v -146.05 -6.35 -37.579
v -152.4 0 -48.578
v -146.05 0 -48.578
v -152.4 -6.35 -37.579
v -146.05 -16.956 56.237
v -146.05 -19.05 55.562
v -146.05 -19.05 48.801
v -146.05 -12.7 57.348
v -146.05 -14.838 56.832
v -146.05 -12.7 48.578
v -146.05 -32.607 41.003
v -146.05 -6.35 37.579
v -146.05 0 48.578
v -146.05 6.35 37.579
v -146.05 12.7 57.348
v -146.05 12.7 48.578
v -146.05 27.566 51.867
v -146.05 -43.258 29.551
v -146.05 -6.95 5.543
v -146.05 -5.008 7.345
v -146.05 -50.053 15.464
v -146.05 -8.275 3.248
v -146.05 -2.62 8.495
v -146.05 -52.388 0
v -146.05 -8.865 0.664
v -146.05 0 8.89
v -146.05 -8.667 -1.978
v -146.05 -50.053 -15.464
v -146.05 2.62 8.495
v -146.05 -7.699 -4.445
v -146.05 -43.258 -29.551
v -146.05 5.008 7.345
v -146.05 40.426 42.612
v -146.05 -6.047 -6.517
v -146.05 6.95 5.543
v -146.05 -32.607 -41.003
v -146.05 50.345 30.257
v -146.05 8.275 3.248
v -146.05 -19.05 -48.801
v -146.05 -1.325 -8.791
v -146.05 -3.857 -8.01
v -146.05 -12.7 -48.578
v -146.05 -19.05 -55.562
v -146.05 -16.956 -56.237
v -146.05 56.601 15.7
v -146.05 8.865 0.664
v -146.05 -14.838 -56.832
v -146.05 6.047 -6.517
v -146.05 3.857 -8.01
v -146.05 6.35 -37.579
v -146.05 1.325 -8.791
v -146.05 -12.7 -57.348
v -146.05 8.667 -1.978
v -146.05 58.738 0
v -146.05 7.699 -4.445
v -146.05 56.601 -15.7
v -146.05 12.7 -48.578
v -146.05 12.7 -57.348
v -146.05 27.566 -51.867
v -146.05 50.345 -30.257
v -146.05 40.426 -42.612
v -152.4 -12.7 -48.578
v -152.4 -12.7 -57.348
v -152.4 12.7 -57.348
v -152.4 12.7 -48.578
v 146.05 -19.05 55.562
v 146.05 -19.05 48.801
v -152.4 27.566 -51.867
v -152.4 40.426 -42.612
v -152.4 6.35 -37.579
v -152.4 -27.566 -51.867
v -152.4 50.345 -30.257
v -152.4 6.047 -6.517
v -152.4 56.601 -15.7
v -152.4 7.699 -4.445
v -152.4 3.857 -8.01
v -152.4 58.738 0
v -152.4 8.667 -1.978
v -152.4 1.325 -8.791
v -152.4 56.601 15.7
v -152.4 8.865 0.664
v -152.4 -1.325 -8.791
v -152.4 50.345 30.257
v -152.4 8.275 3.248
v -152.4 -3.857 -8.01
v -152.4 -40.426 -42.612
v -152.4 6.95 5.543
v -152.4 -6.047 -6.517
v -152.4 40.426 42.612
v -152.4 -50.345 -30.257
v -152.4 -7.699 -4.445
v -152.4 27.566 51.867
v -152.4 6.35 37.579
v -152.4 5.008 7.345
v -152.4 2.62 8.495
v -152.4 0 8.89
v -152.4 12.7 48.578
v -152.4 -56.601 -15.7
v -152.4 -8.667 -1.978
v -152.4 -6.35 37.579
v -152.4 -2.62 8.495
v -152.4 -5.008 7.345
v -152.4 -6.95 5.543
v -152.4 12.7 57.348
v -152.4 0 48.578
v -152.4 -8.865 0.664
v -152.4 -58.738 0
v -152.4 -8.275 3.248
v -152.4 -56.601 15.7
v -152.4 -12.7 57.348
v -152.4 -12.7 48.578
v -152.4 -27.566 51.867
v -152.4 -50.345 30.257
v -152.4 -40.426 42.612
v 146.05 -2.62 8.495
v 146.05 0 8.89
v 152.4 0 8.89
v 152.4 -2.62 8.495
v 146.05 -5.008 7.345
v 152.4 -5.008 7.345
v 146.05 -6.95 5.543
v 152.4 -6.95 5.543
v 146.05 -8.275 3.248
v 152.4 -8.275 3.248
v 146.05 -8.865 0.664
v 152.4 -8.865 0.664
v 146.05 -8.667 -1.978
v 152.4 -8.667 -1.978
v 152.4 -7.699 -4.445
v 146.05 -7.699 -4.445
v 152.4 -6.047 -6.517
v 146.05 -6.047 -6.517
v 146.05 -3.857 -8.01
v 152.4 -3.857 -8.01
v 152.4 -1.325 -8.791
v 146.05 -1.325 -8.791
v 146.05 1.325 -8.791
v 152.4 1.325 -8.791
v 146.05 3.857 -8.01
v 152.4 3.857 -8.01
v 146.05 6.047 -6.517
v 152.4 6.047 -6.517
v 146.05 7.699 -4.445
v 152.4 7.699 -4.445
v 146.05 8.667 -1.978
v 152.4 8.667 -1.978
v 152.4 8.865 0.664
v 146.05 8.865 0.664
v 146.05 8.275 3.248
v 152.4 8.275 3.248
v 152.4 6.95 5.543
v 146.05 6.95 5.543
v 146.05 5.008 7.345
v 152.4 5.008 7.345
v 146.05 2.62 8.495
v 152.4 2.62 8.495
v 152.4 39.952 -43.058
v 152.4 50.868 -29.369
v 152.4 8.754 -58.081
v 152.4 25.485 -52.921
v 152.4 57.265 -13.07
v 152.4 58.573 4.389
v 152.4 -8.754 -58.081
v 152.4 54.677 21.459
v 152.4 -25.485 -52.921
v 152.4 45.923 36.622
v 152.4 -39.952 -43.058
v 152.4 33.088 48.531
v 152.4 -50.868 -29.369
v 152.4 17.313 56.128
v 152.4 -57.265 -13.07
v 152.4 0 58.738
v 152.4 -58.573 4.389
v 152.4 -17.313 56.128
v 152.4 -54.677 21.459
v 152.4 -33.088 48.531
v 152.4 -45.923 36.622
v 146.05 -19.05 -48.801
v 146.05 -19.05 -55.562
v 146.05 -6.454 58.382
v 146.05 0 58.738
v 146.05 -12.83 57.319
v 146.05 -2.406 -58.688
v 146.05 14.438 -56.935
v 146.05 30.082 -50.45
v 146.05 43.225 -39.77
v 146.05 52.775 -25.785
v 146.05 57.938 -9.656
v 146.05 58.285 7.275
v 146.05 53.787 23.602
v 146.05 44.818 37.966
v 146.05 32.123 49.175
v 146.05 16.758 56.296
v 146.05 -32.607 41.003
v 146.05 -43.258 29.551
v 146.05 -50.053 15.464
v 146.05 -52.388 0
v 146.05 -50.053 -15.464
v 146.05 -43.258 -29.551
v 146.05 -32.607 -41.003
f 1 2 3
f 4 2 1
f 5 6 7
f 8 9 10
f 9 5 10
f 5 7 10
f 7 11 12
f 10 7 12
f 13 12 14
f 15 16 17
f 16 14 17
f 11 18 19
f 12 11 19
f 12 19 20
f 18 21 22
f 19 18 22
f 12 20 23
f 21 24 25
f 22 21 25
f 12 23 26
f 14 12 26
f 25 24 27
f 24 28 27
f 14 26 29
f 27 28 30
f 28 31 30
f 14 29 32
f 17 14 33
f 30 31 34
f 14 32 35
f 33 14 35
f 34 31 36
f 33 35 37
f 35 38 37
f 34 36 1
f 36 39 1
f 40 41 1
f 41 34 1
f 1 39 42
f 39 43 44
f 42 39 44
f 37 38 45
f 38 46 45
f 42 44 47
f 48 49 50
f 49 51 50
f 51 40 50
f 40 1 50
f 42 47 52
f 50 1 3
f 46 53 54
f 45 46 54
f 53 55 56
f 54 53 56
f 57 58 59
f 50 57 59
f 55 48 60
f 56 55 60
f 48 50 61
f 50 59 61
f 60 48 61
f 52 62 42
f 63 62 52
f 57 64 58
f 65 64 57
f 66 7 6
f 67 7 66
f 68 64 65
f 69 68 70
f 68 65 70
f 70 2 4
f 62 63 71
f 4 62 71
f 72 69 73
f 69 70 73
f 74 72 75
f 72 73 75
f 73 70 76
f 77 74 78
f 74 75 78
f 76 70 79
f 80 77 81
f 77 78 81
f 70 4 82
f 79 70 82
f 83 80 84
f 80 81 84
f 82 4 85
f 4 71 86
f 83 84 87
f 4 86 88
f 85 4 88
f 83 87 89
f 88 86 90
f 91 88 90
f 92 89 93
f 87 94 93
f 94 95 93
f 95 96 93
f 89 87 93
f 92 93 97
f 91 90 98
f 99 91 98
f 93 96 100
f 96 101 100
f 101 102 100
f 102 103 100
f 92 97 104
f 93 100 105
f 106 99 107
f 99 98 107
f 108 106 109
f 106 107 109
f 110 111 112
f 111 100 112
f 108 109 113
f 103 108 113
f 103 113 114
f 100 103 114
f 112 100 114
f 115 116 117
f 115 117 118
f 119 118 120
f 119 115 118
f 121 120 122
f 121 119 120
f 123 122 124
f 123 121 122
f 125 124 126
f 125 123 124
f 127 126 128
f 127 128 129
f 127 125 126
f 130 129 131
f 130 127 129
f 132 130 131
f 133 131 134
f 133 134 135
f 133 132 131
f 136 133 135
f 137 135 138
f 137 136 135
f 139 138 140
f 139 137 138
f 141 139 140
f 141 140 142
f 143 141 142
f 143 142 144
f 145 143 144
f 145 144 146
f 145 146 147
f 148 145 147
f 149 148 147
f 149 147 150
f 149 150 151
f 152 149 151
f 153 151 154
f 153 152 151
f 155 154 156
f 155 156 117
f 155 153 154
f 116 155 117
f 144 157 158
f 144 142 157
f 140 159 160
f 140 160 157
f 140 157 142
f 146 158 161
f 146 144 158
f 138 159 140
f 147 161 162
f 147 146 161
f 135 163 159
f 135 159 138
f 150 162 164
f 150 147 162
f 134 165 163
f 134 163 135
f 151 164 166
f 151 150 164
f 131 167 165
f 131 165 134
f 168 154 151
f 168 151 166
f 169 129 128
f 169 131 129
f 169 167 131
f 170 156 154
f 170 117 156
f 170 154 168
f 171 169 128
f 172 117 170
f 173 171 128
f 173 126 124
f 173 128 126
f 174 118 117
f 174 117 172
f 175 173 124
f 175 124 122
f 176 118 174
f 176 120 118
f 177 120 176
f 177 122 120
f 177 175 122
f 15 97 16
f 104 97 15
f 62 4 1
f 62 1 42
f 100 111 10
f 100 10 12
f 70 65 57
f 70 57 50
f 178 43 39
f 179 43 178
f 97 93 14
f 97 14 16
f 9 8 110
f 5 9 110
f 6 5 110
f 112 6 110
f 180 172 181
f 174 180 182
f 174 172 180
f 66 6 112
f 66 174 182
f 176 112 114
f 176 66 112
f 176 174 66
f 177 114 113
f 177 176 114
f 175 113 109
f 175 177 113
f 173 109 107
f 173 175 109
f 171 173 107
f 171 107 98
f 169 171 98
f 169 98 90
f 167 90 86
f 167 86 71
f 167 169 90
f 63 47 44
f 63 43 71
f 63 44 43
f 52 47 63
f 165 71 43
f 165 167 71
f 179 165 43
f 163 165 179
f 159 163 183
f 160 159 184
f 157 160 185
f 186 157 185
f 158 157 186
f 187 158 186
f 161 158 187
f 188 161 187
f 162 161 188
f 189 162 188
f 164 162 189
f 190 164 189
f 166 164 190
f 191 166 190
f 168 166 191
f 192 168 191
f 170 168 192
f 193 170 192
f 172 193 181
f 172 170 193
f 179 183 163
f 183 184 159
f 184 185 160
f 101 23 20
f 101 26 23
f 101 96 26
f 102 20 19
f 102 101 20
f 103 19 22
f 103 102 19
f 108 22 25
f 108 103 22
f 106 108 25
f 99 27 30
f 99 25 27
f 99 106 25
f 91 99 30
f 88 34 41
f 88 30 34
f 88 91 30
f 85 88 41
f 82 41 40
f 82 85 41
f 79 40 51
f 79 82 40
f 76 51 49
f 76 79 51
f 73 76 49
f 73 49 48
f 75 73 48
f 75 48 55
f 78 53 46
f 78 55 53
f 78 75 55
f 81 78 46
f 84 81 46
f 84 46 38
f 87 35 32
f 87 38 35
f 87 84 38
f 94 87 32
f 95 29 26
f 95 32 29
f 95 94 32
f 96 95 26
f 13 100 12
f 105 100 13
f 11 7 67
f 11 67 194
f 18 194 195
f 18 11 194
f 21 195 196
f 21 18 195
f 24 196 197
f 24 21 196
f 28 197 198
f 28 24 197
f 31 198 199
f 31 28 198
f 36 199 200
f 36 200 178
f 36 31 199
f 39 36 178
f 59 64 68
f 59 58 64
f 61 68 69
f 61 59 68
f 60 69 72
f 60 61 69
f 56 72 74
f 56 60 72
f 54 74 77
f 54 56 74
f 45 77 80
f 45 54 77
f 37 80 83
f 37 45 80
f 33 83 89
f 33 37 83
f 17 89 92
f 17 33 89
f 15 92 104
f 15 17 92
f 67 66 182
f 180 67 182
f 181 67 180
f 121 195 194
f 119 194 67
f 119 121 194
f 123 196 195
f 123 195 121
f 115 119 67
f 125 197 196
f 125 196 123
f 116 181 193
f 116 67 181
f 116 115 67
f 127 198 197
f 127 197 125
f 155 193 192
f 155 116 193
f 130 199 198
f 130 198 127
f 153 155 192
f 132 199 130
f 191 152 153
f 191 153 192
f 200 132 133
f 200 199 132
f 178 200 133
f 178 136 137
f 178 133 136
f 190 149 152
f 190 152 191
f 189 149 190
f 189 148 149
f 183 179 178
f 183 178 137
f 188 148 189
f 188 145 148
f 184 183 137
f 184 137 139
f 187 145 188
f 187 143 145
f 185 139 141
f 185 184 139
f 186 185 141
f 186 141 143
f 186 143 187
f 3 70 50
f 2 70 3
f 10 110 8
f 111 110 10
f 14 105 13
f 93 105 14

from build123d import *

# Parameters (mm, degrees)
SKETCH1_R               = 58.7375
SKETCH1_R_2             = 8.89
BOSS_EXTRUDE1_DEPTH     = 152.4
CUT_EXTRUDE1_DEPTH      = 174.568279972
CUT_EXTRUDE1_DEPTH_BACK = 174.568279972
SKETCH2_W               = 292.1
SKETCH2_H               = 77.7875
SHELL1_START            = -146.05
SHELL1_DEPTH            = 292.1
CUT_EXTRUDE2_DEPTH      = 12.7


# Read off the part's stored shape, not the designer's step: Shell1
with BuildPart() as part:
    # Sketch1 → Boss-Extrude1 (new, symmetric)
    with BuildSketch(Plane(origin=(0, 0, 0), x_dir=(0, 0, -1), z_dir=(1, 0, 0))):
        with Locations(Location((0, 0, 0), (0, 0, 180))):
            Circle(SKETCH1_R)
        with Locations(Location((0, 0, 0), (0, 0, 180))):
            Circle(SKETCH1_R_2, mode=Mode.SUBTRACT)
    extrude(amount=BOSS_EXTRUDE1_DEPTH, both=True)

    # Sketch2 → Cut-Extrude1 (cut, two sides: drawn at the far end of the back side and taken through both)
    with BuildSketch(Plane.XY.offset(-CUT_EXTRUDE1_DEPTH_BACK)):
        with Locations((0, 19.84375)):
            Rectangle(SKETCH2_W, SKETCH2_H)
    extrude(amount=CUT_EXTRUDE1_DEPTH + CUT_EXTRUDE1_DEPTH_BACK, mode=Mode.SUBTRACT)

    # Shell1 outline → Shell1 (cut)
    with BuildSketch(Plane.YZ.offset(SHELL1_START)):
        with BuildLine():
            ThreePointArc((-19.05, 48.801103023), (-52.3875, 0), (-19.05, -48.801103023))
            Line((-19.05, -48.801103023), (-19.05, 48.801103023))
        make_face()
    extrude(amount=SHELL1_DEPTH, mode=Mode.SUBTRACT)

    # Sketch3 → Cut-Extrude2 (cut)
    with BuildSketch(Plane.ZY.offset(152.4)):
        Polygon((-48.5775, 12.7), (-37.578977372, 6.35), (-48.5775, 0), (-37.578977372, -6.35), (-48.5775, -12.7), (-58.7375, -12.7), (-58.7375, 12.7), align=None)
        Polygon((48.5775, 12.7), (58.7375, 12.7), (58.7375, -12.7), (48.5775, -12.7), (37.578977372, -6.35), (48.5775, 0), (37.578977372, 6.35), align=None)
    extrude(amount=-CUT_EXTRUDE2_DEPTH, mode=Mode.SUBTRACT)


solid = part.part
